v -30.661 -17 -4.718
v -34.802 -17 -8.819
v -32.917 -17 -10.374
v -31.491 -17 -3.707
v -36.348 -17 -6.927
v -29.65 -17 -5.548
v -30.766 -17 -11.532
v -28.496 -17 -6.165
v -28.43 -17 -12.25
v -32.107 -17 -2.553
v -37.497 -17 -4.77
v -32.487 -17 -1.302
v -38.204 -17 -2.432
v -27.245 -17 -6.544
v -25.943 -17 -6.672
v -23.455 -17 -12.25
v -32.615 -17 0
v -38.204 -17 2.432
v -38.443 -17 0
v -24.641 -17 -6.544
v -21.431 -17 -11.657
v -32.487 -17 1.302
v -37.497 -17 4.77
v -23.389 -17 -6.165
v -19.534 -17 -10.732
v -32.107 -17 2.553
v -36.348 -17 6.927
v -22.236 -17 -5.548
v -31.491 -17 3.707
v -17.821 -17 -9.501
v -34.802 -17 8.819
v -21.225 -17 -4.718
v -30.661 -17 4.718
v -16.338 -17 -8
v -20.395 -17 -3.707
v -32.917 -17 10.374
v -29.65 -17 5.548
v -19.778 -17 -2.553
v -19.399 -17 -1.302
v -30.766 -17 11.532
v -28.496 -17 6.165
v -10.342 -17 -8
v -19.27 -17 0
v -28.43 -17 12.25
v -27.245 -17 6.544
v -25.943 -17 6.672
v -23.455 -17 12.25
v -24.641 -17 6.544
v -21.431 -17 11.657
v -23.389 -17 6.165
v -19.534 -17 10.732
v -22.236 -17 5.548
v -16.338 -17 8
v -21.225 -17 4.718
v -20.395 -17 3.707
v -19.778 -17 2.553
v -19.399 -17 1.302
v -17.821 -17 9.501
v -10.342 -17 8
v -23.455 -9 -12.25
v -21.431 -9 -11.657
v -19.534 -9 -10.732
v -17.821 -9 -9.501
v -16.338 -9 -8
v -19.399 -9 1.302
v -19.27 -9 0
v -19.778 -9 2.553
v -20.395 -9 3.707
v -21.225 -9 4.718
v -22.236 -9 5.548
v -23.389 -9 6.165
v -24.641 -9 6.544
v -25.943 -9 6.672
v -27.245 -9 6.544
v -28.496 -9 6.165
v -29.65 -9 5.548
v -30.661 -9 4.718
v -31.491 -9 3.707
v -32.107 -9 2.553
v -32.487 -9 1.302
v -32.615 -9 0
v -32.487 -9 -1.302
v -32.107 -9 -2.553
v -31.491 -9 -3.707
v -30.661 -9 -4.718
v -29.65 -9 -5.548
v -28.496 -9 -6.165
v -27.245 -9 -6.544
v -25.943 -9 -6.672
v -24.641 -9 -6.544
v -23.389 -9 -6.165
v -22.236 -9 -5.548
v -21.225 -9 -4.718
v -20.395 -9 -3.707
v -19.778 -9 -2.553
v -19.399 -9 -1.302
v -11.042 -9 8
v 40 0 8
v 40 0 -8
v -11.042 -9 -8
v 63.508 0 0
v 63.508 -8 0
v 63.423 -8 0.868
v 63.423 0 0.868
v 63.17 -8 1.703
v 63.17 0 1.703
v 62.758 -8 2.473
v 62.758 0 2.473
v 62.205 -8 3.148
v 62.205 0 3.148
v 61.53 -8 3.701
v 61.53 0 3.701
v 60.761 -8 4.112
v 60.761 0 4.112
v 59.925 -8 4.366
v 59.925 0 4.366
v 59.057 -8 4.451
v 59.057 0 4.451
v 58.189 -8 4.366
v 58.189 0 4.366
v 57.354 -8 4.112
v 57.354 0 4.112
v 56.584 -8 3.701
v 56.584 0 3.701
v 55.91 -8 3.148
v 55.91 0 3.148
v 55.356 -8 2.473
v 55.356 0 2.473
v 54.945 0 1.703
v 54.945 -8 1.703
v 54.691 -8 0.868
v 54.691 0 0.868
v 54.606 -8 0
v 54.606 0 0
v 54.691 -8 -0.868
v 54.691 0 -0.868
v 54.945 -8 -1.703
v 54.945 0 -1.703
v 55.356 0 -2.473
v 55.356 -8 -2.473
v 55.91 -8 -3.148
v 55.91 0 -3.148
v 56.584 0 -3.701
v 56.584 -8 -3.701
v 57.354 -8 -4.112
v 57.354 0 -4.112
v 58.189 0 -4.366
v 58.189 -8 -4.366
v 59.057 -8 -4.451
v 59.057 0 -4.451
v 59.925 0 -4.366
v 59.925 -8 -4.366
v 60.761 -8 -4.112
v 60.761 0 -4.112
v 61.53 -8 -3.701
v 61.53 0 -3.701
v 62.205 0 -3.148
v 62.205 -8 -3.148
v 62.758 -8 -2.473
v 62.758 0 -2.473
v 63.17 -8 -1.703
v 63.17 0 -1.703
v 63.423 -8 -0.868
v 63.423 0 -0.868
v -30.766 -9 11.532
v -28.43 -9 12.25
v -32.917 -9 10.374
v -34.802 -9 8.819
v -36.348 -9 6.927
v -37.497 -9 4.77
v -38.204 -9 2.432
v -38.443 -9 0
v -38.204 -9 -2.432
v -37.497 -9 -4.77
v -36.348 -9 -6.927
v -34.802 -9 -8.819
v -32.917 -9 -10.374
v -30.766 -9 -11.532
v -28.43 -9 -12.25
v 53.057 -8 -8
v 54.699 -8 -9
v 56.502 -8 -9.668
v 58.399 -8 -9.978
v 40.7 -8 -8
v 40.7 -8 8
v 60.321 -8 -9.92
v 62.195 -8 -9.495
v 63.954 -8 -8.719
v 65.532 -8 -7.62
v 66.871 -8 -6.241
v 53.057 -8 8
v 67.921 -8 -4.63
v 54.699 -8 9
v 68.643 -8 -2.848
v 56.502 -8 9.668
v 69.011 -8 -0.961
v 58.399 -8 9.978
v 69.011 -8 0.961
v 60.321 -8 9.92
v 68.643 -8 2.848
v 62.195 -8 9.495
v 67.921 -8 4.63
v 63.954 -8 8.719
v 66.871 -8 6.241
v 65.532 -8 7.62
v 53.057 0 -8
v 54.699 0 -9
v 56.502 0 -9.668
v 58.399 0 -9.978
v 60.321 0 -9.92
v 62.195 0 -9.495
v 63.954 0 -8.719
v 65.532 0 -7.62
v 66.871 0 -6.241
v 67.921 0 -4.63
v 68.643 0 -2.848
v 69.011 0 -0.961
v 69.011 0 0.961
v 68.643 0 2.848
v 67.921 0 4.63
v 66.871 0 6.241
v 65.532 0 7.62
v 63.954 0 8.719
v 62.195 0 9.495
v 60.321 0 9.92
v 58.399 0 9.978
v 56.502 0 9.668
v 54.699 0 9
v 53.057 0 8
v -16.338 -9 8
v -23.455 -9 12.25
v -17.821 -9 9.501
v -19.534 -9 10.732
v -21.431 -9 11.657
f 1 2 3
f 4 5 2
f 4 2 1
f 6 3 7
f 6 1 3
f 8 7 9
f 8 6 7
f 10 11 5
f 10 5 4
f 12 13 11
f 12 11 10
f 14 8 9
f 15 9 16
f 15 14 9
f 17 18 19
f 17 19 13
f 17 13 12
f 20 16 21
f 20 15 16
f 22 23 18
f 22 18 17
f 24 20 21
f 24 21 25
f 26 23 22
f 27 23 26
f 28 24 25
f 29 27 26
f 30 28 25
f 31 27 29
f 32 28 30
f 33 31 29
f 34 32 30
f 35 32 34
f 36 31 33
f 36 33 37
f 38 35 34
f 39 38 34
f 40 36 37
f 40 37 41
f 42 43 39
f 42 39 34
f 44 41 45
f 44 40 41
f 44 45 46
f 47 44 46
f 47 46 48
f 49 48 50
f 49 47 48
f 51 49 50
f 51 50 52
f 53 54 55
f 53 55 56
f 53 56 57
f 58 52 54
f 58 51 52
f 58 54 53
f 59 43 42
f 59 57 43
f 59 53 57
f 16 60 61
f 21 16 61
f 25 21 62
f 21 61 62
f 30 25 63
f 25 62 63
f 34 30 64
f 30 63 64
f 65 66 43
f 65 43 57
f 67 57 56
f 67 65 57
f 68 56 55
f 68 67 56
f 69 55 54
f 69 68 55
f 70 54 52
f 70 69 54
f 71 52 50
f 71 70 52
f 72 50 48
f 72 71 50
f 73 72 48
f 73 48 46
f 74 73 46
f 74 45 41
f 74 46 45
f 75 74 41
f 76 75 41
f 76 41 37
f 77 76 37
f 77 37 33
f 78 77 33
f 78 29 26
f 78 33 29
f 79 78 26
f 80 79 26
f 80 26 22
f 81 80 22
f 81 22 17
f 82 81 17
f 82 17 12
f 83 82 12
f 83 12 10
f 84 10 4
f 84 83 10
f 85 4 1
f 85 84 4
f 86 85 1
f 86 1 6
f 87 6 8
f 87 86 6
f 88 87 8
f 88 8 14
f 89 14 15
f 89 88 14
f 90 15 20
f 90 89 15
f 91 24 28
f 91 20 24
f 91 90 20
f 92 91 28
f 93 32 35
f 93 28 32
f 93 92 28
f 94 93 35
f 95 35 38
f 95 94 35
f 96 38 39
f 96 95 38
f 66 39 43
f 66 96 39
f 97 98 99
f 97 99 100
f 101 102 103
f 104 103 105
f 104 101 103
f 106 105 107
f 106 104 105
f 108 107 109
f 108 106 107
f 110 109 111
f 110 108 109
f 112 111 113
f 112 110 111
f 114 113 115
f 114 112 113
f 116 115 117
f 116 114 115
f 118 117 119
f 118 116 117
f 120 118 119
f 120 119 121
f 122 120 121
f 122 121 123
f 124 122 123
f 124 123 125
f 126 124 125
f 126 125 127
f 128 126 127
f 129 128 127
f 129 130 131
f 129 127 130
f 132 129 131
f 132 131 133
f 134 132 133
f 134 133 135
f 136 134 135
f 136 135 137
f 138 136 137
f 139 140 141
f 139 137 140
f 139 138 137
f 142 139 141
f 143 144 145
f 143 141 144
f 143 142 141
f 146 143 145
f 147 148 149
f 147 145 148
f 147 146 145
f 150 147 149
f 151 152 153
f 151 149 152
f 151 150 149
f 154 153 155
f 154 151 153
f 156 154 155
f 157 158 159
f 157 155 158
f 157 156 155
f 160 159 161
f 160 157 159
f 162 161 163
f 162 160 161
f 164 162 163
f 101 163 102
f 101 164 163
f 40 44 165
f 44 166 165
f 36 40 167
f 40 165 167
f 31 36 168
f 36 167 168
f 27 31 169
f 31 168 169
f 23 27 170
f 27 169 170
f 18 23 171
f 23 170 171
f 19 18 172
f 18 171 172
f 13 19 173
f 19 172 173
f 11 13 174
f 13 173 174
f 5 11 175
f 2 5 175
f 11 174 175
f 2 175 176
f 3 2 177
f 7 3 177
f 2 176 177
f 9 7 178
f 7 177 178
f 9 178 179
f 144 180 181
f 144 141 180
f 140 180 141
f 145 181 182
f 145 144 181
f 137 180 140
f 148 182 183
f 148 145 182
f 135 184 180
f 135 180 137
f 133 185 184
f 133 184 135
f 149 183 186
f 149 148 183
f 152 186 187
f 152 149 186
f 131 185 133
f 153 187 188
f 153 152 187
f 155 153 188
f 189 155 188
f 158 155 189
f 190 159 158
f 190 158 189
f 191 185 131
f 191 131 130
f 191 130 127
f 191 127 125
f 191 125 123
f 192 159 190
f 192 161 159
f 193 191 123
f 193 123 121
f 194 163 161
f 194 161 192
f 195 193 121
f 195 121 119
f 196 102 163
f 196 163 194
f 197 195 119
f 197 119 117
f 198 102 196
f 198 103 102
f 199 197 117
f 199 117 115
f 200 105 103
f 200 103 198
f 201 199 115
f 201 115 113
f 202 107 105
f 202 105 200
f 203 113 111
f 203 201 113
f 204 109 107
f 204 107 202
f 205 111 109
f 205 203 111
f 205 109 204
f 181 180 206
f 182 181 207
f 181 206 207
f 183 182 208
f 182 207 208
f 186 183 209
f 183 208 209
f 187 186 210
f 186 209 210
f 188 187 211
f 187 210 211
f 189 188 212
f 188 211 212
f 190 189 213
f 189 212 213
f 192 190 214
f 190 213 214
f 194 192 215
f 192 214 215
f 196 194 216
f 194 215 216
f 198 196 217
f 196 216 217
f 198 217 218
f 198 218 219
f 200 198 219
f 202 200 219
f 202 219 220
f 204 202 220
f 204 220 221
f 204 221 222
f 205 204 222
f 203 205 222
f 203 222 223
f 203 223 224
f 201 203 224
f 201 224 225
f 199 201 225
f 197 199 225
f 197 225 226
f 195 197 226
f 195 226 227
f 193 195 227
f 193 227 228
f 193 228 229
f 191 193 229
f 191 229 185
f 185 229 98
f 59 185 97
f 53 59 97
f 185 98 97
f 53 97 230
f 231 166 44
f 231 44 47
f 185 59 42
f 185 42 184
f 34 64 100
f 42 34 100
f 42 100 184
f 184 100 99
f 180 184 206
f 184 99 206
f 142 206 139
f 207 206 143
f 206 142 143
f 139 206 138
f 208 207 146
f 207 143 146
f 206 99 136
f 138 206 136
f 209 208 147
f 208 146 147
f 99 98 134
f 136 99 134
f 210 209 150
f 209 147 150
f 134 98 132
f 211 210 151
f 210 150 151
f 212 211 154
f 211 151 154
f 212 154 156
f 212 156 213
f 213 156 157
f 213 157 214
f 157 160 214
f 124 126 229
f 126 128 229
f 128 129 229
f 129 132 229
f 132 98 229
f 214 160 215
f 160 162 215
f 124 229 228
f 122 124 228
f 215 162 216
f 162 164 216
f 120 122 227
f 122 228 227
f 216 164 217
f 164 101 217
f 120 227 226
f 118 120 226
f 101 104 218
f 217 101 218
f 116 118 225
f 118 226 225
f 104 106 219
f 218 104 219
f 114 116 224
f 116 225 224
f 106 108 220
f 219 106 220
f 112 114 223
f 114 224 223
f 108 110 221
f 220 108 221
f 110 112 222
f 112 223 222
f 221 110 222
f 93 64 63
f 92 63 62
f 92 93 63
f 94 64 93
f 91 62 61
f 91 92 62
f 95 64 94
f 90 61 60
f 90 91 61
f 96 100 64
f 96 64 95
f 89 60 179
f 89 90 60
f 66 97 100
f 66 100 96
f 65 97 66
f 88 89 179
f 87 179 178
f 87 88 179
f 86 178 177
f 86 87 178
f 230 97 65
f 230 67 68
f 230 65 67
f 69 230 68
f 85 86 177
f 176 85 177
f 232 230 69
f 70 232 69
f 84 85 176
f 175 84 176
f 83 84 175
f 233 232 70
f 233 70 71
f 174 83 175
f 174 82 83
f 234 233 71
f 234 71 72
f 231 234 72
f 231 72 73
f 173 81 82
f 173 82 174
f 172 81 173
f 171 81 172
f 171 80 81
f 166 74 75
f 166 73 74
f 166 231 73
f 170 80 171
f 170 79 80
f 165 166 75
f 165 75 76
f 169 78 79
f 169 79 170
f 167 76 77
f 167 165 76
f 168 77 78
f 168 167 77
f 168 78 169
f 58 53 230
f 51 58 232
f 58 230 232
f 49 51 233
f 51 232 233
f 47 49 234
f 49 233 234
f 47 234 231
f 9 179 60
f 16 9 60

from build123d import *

# Parameters (mm, degrees)
F0_R     = 6.672459
F0_R_2   = 4.451297
F1_DEPTH = 25
F3_DEPTH = 12.25


with BuildPart() as f1:
    # F0 (on Front) → F1 (new body)
    with BuildSketch(Plane.XZ):
        with BuildLine():
            Line((53.057076, 8), (-16.338237, 8))
            ThreePointArc((-16.338237, 8), (-38.442924, 0), (-16.338237, -8))
            Line((-16.338237, -8), (53.057076, -8))
            ThreePointArc((53.057076, -8), (69.057076, 0), (53.057076, 8))
        make_face()
        with Locations((-25.942924, 0)):
            Circle(F0_R, mode=Mode.SUBTRACT)
        with Locations((59.057076, 0)):
            Circle(F0_R_2, mode=Mode.SUBTRACT)
    extrude(amount=F1_DEPTH)

    # F2 (on Top) → F3 (intersect, symmetric)
    with BuildSketch(Plane.XY):
        Polygon((-11.041536, -9), (-38.442924, -9), (-38.442924, -17), (-10.341627, -17), (40.699909, -8), (69.057076, -8), (69.057076, 0), (40, 0), align=None)
    extrude(amount=F3_DEPTH, both=True, mode=Mode.INTERSECT)


solid = f1.part
